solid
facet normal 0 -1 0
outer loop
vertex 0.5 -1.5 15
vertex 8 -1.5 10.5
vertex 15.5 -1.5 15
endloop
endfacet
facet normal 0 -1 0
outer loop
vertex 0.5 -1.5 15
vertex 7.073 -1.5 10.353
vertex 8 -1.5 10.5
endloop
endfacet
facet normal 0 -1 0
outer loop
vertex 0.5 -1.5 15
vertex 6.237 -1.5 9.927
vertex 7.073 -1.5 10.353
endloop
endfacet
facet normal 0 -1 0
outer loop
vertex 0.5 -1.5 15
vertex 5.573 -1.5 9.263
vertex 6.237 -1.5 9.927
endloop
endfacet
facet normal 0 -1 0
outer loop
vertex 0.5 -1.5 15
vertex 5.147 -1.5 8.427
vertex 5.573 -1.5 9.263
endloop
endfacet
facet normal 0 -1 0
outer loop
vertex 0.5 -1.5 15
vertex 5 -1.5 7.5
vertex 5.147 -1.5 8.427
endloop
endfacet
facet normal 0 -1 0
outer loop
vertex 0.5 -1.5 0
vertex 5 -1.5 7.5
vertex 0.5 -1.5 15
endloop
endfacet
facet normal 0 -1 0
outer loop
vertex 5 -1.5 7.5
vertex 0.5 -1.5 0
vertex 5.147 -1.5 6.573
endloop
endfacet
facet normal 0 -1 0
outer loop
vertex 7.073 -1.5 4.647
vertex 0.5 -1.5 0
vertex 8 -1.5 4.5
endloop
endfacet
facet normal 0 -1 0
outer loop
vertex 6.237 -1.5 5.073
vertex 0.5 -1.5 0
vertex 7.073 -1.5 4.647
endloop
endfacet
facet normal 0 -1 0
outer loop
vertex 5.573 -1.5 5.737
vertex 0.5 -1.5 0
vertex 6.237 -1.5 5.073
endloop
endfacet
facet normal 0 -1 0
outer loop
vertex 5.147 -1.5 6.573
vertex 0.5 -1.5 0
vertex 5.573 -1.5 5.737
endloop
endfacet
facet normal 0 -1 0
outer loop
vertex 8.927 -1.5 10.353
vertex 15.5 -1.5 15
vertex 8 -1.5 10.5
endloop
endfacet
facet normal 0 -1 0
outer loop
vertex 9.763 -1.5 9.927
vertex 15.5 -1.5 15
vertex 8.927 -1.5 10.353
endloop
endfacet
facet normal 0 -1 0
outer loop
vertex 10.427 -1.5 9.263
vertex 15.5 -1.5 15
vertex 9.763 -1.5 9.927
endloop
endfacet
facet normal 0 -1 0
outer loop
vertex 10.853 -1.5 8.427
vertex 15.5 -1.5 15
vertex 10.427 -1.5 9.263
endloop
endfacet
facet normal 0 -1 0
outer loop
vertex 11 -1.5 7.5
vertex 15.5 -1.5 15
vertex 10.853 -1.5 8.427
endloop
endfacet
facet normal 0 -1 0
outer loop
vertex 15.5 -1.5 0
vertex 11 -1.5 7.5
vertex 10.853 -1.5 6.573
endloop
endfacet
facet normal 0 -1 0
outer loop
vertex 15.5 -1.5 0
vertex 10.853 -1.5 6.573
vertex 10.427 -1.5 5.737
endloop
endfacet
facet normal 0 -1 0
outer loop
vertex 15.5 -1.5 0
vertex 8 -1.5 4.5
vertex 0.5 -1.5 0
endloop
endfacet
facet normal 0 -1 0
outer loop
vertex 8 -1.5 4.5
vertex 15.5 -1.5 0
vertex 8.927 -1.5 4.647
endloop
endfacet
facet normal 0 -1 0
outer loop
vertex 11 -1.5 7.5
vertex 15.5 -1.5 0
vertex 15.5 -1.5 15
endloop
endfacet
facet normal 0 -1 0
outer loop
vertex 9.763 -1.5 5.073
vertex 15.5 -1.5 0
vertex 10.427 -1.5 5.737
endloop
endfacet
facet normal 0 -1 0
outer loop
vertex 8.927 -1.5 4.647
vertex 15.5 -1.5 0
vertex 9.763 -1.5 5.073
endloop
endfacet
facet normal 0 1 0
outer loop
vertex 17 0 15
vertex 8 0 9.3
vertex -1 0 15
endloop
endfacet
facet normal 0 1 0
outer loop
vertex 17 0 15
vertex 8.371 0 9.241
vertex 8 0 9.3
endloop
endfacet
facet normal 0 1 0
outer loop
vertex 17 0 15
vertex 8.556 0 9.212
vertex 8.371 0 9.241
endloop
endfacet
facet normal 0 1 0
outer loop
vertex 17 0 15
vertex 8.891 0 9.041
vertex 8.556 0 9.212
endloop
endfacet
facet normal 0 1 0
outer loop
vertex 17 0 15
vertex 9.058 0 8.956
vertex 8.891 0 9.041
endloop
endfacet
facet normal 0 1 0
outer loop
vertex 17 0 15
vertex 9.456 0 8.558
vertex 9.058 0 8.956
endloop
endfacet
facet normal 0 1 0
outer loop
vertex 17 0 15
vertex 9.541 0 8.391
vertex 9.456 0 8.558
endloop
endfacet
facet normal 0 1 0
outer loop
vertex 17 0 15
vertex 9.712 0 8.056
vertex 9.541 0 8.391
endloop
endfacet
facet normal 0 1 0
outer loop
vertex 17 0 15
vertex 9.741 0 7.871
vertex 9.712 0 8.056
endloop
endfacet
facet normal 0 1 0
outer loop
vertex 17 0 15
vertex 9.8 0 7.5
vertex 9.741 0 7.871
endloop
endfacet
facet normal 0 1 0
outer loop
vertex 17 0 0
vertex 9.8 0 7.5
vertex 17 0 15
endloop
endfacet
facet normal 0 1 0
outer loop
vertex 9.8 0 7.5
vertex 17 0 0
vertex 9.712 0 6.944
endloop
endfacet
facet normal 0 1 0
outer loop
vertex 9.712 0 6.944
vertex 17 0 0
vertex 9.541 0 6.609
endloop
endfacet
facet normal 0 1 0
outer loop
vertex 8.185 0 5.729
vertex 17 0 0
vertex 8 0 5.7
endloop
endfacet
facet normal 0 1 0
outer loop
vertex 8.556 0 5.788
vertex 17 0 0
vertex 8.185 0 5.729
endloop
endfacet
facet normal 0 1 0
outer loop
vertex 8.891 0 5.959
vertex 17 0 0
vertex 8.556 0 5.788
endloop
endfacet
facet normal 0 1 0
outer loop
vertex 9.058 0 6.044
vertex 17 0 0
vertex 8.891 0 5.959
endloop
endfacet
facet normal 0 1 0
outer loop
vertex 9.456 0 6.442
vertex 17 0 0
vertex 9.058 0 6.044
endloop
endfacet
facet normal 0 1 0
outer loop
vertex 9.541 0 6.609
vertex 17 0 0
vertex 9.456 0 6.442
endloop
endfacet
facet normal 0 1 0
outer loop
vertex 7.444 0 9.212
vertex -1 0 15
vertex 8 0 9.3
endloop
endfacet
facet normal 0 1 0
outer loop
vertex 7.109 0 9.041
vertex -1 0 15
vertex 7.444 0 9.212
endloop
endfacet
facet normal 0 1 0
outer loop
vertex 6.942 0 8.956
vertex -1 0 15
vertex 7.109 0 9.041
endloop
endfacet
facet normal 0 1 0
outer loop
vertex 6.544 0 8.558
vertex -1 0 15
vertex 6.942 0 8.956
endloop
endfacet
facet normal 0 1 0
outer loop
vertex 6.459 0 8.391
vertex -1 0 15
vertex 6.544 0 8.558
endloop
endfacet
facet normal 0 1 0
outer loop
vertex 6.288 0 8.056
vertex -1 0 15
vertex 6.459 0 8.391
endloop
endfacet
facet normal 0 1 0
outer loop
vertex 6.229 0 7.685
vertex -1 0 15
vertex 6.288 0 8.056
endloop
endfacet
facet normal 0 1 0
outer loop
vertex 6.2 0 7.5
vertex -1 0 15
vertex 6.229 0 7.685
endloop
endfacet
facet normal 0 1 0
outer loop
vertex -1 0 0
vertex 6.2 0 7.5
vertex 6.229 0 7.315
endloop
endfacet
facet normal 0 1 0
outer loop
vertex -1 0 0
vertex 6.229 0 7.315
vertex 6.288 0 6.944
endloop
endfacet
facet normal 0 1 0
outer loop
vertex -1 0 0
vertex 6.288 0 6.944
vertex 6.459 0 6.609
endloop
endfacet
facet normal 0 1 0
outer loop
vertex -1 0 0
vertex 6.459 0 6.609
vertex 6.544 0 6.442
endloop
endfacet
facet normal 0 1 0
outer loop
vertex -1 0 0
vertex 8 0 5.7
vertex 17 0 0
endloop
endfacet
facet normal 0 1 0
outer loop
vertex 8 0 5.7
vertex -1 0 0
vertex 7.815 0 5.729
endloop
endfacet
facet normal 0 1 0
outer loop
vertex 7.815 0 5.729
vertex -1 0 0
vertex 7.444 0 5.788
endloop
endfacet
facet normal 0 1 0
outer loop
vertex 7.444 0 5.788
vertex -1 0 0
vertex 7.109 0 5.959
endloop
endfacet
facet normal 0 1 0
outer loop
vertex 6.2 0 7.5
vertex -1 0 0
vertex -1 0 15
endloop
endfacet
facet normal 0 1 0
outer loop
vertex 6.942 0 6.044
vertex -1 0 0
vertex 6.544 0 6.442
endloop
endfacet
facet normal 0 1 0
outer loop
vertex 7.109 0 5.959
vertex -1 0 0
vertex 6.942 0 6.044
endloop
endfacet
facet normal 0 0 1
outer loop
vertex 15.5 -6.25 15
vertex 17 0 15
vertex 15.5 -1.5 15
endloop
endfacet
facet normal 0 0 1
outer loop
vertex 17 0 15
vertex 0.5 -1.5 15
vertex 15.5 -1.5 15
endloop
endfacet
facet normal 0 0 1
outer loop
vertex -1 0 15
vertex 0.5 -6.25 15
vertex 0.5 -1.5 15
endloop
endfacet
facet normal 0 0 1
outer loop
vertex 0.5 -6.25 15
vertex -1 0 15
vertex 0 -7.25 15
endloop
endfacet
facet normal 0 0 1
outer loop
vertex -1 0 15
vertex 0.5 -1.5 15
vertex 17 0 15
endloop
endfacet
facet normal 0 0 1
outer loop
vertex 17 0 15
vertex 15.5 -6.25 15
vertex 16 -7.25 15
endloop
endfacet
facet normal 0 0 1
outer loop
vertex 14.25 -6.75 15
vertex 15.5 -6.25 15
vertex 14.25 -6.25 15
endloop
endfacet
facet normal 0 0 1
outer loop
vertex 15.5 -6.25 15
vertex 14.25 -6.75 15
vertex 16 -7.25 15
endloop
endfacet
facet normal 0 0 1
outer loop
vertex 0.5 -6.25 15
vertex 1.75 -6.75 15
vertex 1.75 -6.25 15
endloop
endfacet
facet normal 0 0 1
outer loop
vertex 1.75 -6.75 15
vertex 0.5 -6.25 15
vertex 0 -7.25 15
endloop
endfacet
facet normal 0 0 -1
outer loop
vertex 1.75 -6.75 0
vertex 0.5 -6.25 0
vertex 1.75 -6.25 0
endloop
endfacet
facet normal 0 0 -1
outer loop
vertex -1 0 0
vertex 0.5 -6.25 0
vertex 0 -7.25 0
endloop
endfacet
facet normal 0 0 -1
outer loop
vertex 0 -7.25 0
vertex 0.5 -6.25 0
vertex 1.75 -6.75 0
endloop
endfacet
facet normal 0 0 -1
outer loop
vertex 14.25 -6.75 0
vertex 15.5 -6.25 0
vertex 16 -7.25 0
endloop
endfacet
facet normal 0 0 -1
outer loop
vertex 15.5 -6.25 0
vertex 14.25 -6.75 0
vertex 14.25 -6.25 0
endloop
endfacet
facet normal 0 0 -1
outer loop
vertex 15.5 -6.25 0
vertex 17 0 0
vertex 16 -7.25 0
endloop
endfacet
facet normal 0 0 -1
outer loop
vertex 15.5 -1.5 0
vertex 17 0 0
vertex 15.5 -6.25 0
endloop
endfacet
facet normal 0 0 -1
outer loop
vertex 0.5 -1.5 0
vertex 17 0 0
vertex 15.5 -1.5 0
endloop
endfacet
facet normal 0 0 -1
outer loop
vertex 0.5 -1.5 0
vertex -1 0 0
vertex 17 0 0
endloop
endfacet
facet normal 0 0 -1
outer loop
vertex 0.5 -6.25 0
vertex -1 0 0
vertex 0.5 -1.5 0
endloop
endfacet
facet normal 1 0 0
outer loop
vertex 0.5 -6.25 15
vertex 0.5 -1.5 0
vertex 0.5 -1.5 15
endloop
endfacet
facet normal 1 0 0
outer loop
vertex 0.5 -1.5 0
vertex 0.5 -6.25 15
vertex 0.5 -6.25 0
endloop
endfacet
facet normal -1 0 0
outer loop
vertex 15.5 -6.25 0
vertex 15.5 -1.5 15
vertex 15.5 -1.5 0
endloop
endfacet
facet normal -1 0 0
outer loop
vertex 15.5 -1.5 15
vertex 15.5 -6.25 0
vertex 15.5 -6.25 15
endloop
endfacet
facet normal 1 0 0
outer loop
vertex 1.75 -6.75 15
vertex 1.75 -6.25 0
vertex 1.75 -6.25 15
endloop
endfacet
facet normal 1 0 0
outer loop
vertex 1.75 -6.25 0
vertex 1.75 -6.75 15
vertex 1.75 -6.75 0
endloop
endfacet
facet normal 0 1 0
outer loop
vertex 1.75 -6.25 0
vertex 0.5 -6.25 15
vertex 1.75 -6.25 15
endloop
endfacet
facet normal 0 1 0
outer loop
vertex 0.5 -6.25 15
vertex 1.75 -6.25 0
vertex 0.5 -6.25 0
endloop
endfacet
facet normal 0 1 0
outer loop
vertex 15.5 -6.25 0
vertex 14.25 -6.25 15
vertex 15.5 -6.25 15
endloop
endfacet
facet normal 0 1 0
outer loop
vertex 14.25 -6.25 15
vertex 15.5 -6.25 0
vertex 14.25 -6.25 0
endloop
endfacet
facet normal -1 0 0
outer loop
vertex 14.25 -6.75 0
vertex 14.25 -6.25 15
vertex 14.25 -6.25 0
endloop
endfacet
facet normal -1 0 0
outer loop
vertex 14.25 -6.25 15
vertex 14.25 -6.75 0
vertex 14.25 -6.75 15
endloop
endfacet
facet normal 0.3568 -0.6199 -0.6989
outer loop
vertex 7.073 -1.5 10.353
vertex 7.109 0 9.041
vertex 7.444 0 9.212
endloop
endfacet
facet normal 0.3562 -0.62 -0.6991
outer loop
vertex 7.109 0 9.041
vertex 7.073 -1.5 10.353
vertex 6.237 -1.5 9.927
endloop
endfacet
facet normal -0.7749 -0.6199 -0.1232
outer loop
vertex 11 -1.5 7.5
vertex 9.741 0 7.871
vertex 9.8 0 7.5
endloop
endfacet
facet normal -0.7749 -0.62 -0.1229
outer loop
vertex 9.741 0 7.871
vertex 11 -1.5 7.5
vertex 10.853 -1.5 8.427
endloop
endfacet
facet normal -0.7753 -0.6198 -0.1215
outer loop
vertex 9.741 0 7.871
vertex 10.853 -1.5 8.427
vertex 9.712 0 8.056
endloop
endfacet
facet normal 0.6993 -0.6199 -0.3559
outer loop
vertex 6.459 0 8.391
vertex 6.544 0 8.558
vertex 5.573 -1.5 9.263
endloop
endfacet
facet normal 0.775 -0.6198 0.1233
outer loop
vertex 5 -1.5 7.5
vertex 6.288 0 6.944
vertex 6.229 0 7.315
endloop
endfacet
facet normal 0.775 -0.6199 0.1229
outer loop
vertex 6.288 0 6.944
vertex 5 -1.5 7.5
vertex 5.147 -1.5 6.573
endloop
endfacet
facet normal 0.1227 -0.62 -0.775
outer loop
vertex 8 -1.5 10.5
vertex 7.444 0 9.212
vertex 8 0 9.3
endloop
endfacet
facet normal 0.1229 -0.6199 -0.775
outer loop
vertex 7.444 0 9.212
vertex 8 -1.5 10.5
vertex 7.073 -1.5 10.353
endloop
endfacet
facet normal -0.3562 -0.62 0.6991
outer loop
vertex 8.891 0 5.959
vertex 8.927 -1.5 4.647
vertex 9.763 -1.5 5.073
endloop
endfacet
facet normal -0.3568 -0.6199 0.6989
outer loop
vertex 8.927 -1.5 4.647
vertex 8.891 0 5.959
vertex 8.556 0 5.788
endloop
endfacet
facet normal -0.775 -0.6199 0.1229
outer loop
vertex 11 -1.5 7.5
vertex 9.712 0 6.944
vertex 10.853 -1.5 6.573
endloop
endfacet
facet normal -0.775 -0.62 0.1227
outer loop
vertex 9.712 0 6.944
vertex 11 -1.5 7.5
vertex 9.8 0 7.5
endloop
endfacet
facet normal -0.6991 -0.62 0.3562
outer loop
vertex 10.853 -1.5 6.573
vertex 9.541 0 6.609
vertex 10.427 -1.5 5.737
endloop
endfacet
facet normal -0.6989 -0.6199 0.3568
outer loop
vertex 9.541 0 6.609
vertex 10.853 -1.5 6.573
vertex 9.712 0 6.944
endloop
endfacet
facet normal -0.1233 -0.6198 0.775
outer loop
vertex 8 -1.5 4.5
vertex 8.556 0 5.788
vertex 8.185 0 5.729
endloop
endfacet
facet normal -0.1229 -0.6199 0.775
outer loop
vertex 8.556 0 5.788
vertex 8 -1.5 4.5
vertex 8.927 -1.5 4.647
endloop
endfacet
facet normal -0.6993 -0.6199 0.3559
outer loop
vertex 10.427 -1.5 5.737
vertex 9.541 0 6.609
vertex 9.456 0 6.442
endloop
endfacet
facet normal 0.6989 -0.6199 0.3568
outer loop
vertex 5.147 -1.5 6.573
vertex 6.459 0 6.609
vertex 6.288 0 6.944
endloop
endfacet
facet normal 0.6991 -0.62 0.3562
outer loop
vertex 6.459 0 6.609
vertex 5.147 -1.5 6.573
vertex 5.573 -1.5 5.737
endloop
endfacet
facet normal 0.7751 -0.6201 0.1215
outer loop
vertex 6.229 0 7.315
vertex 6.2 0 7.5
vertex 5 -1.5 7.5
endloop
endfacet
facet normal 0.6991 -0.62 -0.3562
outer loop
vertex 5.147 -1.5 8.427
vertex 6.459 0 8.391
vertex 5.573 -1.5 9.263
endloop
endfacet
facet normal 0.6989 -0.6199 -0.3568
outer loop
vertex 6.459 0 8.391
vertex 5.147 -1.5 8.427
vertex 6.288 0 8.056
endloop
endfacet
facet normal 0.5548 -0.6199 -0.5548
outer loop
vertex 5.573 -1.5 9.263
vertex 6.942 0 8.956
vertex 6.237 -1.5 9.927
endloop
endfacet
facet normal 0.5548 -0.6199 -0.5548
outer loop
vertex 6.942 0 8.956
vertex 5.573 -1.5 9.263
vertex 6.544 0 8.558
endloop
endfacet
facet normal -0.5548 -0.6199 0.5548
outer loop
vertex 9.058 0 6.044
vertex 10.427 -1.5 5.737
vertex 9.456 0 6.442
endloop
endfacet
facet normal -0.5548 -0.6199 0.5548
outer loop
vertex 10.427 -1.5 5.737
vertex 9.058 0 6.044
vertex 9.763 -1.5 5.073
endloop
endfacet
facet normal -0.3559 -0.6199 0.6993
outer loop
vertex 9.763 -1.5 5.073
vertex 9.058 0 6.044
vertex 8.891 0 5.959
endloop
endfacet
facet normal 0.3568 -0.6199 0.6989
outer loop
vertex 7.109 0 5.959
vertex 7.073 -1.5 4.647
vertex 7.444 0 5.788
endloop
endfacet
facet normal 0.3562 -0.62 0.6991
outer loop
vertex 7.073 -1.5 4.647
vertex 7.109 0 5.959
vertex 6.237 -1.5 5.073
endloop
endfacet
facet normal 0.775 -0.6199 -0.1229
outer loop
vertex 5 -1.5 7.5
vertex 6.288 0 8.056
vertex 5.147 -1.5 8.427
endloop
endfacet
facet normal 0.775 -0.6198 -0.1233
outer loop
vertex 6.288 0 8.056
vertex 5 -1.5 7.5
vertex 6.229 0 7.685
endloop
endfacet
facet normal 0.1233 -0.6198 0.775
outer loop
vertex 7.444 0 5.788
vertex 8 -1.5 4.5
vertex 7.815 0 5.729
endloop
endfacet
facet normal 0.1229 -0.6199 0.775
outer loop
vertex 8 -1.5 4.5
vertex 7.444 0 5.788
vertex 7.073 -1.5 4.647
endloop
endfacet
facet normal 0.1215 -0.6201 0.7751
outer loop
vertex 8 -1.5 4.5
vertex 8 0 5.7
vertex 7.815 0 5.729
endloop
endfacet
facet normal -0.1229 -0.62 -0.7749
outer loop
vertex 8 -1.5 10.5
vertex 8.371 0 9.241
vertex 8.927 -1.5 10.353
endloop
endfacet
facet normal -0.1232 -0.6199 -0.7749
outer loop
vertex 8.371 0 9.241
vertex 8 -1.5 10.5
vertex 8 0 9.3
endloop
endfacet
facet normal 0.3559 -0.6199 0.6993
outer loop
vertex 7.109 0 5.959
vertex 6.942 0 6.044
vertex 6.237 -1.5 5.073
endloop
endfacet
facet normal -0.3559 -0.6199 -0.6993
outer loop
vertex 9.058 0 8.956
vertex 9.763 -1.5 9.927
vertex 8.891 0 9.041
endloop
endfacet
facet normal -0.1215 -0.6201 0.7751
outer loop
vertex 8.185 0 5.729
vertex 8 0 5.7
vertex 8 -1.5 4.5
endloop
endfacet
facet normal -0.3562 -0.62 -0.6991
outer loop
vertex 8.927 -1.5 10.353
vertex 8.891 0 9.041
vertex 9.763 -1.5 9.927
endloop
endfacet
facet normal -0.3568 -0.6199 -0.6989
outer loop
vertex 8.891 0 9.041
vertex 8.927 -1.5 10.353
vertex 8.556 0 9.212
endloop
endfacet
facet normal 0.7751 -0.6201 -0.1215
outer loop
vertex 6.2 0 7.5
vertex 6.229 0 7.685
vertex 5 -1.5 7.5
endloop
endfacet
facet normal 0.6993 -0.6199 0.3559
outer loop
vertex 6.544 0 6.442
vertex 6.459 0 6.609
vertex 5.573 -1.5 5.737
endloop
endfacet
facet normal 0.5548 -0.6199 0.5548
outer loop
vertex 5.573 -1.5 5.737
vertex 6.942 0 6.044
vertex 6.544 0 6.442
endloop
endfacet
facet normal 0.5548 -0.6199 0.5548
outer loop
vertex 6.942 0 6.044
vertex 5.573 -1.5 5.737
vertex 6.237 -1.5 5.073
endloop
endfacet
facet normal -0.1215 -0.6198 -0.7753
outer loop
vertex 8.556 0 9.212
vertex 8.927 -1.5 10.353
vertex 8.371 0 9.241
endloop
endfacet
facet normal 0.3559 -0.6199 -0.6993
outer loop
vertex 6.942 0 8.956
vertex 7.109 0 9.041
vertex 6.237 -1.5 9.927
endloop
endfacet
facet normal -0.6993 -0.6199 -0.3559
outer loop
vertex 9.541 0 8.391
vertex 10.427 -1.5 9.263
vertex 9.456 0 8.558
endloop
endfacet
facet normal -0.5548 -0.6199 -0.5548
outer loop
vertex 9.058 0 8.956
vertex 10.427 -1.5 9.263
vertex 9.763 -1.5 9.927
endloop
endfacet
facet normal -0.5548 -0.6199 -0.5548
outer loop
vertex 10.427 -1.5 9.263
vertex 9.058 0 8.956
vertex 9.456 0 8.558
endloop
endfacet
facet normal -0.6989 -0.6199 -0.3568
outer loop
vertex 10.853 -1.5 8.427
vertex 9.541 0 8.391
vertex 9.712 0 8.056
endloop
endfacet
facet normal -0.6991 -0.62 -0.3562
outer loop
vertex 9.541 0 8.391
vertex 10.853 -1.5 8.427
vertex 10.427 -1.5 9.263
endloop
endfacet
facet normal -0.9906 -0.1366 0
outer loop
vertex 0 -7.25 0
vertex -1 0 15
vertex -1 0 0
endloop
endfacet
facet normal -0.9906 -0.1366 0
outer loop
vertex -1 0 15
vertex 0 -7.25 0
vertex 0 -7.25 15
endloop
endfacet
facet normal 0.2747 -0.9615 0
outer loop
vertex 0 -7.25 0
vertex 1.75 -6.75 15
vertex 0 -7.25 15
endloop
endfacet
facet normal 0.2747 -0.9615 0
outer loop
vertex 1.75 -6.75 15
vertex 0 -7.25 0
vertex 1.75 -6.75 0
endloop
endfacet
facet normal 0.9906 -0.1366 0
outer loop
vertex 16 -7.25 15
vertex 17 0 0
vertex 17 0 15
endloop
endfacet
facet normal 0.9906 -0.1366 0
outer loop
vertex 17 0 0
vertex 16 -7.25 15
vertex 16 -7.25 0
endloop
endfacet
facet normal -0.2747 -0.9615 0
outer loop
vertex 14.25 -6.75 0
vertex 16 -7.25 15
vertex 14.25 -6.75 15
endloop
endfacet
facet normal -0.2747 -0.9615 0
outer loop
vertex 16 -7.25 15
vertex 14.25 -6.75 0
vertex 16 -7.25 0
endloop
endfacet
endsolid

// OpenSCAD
// 2015-09-12 Todd S. Coffey
// Bracket for mounting a neopixel strip under a cabinet. 
// 
// My Dotstar 60 pixel/meter strips have the following 
// approximate dimensions as measured with a caliper:
// width = 14.25mm
// height = 4.30mm

// All numbers below are in units of mm.

// I printed this with a PrintrBot Simple Metal in Cura
// 0.3mm layer height, 0.4mm shell thickness, 100% fill,
// and rotated on its side so no support is needed.

insideX = 15;  // 15
insideY = 15;  // 148 will fit on PrintrBot
insideZ = 4.75;  // 4.75
backThickness = 1.5;  // 2
sideThickness = 0.5; // 0.5
topThickness = 0.5; // 0.5

gapX = insideX-2.5;
screwHoles = 1; // number of screw holes
screwHoleD= 2; // 2
screwHeadZ = 2.5; // 2.5
screwHeadD = 6; // 6

sideSupportX = 1; // mm of wedge support on outside along rail
sideSupportZ0 = 0; 

topSupportZ = 0.5;

outsideX = insideX + 2*sideThickness;
outsideY = insideY;
outsideZ = backThickness+insideZ+topThickness+topSupportZ;
captureX = (outsideX - gapX)/2.0;

rotate(a=[90,0,0])
bracket();

module bracketBase() {
    cube([outsideX,outsideY,backThickness]);
    cube([sideThickness,outsideY,backThickness+insideZ+topThickness]);
    translate([outsideX-sideThickness,0,0]) { 
        cube([sideThickness,outsideY,backThickness+insideZ+topThickness]); 
        }
    translate([0,0,backThickness+insideZ]) { 
        cube([captureX,outsideY,topThickness]); 
        }
    translate([outsideX-captureX,0,backThickness+insideZ]) { 
        cube([captureX,outsideY,topThickness]); 
        }
}
module beveledHole(num) {
    for (s=[0:num-1]) {
        shiftX = outsideX/2;
        shiftY = (2*s+1)*outsideY/(2*num);
  translate([shiftX,shiftY,0]) { 
      cylinder(d=screwHoleD,h=backThickness,$fn=20); 
      }
  translate([shiftX,shiftY,backThickness-screwHeadZ]) { 
      cylinder(d1=screwHoleD,d2=screwHeadD,h=screwHeadZ,$fn=20); 
      }
  }
}
module bracket() {
    difference() {
        bracketBase();
        beveledHole(screwHoles);
    }
    supports();
       
} 
curveR = 1;
module cutoutShape() {
    intersection() {
        supportLeft();
        translate([0,0,outsideZ-curveR]) {
            cube([curveR,outsideY,curveR]);
        }
    }
}    
module smoothedEdge() {
    
}

module supports() {
  
    
//    intersection() {
//        translate([.5,0,0]) {
//            rotate(a=[270,0,0]) {
//                cylinder(r=outsideZ-0.2,h=outsideY,$fn=400);
//            }
//        }   
        supportLeft();
//    }
    supportRight();
}
module supportLeft() {
    sideSupportLeft();
    topSupportLeft();
}
module supportRight() {
    sideSupportRight();
    topSupportRight();
}
module sideSupportLeft() {
    p0 = [0,0,sideSupportZ0];
    p1 = [-sideSupportX,0,sideSupportZ0];
    p2 = [0,0,outsideZ];
    p3 = [0,outsideY,sideSupportZ0];
    p4 = [-sideSupportX,outsideY,sideSupportZ0];
    p5 = [0,outsideY,outsideZ];
    tri0 = [0,1,2];
    tri1 = [5,4,3];
    quad0 = [3,4,1,0];
    quad1 = [0,2,5,3];
    quad2 = [1,4,5,2];
    polyhedron(points=[p0,p1,p2,p3,p4,p5],faces=[tri0,tri1,quad0,quad1,quad2]);
}
module sideSupportRight() {
    translate([outsideX,0,0]) {
        mirror([1,0,0]) {
            sideSupportLeft();
        }
    }
}
module sideSupports() {
    if (sideSupportX > 0) {
        sideSupportLeft();
        sideSupportRight();
    }
}
module topSupportLeft() {
    p0 = [0,0,outsideZ-topSupportZ];
    p1 = [0,0,outsideZ];
    p2 = [captureX,0,outsideZ-topSupportZ];
    p3 = [0,outsideY,outsideZ-topSupportZ];
    p4 = [0,outsideY,outsideZ];
    p5 = [captureX,outsideY,outsideZ-topSupportZ];
    tri0 = [0,1,2];
    tri1 = [3,5,4];
    quad0 = [0,2,5,3];
    quad1 = [0,3,4,1];
    quad2 = [1,4,5,2];
    polyhedron(points=[p0,p1,p2,p3,p4,p5],faces=[tri0,tri1,quad0,quad1,quad2]);
}
module topSupportRight() {
    translate([outsideX,0,0]) {
        mirror([1,0,0]) {
            topSupportLeft();
        }
    }
}
module topSupports() {
    if (topSupportZ > 0) {
        topSupportLeft();
        topSupportRight();
    }
}
